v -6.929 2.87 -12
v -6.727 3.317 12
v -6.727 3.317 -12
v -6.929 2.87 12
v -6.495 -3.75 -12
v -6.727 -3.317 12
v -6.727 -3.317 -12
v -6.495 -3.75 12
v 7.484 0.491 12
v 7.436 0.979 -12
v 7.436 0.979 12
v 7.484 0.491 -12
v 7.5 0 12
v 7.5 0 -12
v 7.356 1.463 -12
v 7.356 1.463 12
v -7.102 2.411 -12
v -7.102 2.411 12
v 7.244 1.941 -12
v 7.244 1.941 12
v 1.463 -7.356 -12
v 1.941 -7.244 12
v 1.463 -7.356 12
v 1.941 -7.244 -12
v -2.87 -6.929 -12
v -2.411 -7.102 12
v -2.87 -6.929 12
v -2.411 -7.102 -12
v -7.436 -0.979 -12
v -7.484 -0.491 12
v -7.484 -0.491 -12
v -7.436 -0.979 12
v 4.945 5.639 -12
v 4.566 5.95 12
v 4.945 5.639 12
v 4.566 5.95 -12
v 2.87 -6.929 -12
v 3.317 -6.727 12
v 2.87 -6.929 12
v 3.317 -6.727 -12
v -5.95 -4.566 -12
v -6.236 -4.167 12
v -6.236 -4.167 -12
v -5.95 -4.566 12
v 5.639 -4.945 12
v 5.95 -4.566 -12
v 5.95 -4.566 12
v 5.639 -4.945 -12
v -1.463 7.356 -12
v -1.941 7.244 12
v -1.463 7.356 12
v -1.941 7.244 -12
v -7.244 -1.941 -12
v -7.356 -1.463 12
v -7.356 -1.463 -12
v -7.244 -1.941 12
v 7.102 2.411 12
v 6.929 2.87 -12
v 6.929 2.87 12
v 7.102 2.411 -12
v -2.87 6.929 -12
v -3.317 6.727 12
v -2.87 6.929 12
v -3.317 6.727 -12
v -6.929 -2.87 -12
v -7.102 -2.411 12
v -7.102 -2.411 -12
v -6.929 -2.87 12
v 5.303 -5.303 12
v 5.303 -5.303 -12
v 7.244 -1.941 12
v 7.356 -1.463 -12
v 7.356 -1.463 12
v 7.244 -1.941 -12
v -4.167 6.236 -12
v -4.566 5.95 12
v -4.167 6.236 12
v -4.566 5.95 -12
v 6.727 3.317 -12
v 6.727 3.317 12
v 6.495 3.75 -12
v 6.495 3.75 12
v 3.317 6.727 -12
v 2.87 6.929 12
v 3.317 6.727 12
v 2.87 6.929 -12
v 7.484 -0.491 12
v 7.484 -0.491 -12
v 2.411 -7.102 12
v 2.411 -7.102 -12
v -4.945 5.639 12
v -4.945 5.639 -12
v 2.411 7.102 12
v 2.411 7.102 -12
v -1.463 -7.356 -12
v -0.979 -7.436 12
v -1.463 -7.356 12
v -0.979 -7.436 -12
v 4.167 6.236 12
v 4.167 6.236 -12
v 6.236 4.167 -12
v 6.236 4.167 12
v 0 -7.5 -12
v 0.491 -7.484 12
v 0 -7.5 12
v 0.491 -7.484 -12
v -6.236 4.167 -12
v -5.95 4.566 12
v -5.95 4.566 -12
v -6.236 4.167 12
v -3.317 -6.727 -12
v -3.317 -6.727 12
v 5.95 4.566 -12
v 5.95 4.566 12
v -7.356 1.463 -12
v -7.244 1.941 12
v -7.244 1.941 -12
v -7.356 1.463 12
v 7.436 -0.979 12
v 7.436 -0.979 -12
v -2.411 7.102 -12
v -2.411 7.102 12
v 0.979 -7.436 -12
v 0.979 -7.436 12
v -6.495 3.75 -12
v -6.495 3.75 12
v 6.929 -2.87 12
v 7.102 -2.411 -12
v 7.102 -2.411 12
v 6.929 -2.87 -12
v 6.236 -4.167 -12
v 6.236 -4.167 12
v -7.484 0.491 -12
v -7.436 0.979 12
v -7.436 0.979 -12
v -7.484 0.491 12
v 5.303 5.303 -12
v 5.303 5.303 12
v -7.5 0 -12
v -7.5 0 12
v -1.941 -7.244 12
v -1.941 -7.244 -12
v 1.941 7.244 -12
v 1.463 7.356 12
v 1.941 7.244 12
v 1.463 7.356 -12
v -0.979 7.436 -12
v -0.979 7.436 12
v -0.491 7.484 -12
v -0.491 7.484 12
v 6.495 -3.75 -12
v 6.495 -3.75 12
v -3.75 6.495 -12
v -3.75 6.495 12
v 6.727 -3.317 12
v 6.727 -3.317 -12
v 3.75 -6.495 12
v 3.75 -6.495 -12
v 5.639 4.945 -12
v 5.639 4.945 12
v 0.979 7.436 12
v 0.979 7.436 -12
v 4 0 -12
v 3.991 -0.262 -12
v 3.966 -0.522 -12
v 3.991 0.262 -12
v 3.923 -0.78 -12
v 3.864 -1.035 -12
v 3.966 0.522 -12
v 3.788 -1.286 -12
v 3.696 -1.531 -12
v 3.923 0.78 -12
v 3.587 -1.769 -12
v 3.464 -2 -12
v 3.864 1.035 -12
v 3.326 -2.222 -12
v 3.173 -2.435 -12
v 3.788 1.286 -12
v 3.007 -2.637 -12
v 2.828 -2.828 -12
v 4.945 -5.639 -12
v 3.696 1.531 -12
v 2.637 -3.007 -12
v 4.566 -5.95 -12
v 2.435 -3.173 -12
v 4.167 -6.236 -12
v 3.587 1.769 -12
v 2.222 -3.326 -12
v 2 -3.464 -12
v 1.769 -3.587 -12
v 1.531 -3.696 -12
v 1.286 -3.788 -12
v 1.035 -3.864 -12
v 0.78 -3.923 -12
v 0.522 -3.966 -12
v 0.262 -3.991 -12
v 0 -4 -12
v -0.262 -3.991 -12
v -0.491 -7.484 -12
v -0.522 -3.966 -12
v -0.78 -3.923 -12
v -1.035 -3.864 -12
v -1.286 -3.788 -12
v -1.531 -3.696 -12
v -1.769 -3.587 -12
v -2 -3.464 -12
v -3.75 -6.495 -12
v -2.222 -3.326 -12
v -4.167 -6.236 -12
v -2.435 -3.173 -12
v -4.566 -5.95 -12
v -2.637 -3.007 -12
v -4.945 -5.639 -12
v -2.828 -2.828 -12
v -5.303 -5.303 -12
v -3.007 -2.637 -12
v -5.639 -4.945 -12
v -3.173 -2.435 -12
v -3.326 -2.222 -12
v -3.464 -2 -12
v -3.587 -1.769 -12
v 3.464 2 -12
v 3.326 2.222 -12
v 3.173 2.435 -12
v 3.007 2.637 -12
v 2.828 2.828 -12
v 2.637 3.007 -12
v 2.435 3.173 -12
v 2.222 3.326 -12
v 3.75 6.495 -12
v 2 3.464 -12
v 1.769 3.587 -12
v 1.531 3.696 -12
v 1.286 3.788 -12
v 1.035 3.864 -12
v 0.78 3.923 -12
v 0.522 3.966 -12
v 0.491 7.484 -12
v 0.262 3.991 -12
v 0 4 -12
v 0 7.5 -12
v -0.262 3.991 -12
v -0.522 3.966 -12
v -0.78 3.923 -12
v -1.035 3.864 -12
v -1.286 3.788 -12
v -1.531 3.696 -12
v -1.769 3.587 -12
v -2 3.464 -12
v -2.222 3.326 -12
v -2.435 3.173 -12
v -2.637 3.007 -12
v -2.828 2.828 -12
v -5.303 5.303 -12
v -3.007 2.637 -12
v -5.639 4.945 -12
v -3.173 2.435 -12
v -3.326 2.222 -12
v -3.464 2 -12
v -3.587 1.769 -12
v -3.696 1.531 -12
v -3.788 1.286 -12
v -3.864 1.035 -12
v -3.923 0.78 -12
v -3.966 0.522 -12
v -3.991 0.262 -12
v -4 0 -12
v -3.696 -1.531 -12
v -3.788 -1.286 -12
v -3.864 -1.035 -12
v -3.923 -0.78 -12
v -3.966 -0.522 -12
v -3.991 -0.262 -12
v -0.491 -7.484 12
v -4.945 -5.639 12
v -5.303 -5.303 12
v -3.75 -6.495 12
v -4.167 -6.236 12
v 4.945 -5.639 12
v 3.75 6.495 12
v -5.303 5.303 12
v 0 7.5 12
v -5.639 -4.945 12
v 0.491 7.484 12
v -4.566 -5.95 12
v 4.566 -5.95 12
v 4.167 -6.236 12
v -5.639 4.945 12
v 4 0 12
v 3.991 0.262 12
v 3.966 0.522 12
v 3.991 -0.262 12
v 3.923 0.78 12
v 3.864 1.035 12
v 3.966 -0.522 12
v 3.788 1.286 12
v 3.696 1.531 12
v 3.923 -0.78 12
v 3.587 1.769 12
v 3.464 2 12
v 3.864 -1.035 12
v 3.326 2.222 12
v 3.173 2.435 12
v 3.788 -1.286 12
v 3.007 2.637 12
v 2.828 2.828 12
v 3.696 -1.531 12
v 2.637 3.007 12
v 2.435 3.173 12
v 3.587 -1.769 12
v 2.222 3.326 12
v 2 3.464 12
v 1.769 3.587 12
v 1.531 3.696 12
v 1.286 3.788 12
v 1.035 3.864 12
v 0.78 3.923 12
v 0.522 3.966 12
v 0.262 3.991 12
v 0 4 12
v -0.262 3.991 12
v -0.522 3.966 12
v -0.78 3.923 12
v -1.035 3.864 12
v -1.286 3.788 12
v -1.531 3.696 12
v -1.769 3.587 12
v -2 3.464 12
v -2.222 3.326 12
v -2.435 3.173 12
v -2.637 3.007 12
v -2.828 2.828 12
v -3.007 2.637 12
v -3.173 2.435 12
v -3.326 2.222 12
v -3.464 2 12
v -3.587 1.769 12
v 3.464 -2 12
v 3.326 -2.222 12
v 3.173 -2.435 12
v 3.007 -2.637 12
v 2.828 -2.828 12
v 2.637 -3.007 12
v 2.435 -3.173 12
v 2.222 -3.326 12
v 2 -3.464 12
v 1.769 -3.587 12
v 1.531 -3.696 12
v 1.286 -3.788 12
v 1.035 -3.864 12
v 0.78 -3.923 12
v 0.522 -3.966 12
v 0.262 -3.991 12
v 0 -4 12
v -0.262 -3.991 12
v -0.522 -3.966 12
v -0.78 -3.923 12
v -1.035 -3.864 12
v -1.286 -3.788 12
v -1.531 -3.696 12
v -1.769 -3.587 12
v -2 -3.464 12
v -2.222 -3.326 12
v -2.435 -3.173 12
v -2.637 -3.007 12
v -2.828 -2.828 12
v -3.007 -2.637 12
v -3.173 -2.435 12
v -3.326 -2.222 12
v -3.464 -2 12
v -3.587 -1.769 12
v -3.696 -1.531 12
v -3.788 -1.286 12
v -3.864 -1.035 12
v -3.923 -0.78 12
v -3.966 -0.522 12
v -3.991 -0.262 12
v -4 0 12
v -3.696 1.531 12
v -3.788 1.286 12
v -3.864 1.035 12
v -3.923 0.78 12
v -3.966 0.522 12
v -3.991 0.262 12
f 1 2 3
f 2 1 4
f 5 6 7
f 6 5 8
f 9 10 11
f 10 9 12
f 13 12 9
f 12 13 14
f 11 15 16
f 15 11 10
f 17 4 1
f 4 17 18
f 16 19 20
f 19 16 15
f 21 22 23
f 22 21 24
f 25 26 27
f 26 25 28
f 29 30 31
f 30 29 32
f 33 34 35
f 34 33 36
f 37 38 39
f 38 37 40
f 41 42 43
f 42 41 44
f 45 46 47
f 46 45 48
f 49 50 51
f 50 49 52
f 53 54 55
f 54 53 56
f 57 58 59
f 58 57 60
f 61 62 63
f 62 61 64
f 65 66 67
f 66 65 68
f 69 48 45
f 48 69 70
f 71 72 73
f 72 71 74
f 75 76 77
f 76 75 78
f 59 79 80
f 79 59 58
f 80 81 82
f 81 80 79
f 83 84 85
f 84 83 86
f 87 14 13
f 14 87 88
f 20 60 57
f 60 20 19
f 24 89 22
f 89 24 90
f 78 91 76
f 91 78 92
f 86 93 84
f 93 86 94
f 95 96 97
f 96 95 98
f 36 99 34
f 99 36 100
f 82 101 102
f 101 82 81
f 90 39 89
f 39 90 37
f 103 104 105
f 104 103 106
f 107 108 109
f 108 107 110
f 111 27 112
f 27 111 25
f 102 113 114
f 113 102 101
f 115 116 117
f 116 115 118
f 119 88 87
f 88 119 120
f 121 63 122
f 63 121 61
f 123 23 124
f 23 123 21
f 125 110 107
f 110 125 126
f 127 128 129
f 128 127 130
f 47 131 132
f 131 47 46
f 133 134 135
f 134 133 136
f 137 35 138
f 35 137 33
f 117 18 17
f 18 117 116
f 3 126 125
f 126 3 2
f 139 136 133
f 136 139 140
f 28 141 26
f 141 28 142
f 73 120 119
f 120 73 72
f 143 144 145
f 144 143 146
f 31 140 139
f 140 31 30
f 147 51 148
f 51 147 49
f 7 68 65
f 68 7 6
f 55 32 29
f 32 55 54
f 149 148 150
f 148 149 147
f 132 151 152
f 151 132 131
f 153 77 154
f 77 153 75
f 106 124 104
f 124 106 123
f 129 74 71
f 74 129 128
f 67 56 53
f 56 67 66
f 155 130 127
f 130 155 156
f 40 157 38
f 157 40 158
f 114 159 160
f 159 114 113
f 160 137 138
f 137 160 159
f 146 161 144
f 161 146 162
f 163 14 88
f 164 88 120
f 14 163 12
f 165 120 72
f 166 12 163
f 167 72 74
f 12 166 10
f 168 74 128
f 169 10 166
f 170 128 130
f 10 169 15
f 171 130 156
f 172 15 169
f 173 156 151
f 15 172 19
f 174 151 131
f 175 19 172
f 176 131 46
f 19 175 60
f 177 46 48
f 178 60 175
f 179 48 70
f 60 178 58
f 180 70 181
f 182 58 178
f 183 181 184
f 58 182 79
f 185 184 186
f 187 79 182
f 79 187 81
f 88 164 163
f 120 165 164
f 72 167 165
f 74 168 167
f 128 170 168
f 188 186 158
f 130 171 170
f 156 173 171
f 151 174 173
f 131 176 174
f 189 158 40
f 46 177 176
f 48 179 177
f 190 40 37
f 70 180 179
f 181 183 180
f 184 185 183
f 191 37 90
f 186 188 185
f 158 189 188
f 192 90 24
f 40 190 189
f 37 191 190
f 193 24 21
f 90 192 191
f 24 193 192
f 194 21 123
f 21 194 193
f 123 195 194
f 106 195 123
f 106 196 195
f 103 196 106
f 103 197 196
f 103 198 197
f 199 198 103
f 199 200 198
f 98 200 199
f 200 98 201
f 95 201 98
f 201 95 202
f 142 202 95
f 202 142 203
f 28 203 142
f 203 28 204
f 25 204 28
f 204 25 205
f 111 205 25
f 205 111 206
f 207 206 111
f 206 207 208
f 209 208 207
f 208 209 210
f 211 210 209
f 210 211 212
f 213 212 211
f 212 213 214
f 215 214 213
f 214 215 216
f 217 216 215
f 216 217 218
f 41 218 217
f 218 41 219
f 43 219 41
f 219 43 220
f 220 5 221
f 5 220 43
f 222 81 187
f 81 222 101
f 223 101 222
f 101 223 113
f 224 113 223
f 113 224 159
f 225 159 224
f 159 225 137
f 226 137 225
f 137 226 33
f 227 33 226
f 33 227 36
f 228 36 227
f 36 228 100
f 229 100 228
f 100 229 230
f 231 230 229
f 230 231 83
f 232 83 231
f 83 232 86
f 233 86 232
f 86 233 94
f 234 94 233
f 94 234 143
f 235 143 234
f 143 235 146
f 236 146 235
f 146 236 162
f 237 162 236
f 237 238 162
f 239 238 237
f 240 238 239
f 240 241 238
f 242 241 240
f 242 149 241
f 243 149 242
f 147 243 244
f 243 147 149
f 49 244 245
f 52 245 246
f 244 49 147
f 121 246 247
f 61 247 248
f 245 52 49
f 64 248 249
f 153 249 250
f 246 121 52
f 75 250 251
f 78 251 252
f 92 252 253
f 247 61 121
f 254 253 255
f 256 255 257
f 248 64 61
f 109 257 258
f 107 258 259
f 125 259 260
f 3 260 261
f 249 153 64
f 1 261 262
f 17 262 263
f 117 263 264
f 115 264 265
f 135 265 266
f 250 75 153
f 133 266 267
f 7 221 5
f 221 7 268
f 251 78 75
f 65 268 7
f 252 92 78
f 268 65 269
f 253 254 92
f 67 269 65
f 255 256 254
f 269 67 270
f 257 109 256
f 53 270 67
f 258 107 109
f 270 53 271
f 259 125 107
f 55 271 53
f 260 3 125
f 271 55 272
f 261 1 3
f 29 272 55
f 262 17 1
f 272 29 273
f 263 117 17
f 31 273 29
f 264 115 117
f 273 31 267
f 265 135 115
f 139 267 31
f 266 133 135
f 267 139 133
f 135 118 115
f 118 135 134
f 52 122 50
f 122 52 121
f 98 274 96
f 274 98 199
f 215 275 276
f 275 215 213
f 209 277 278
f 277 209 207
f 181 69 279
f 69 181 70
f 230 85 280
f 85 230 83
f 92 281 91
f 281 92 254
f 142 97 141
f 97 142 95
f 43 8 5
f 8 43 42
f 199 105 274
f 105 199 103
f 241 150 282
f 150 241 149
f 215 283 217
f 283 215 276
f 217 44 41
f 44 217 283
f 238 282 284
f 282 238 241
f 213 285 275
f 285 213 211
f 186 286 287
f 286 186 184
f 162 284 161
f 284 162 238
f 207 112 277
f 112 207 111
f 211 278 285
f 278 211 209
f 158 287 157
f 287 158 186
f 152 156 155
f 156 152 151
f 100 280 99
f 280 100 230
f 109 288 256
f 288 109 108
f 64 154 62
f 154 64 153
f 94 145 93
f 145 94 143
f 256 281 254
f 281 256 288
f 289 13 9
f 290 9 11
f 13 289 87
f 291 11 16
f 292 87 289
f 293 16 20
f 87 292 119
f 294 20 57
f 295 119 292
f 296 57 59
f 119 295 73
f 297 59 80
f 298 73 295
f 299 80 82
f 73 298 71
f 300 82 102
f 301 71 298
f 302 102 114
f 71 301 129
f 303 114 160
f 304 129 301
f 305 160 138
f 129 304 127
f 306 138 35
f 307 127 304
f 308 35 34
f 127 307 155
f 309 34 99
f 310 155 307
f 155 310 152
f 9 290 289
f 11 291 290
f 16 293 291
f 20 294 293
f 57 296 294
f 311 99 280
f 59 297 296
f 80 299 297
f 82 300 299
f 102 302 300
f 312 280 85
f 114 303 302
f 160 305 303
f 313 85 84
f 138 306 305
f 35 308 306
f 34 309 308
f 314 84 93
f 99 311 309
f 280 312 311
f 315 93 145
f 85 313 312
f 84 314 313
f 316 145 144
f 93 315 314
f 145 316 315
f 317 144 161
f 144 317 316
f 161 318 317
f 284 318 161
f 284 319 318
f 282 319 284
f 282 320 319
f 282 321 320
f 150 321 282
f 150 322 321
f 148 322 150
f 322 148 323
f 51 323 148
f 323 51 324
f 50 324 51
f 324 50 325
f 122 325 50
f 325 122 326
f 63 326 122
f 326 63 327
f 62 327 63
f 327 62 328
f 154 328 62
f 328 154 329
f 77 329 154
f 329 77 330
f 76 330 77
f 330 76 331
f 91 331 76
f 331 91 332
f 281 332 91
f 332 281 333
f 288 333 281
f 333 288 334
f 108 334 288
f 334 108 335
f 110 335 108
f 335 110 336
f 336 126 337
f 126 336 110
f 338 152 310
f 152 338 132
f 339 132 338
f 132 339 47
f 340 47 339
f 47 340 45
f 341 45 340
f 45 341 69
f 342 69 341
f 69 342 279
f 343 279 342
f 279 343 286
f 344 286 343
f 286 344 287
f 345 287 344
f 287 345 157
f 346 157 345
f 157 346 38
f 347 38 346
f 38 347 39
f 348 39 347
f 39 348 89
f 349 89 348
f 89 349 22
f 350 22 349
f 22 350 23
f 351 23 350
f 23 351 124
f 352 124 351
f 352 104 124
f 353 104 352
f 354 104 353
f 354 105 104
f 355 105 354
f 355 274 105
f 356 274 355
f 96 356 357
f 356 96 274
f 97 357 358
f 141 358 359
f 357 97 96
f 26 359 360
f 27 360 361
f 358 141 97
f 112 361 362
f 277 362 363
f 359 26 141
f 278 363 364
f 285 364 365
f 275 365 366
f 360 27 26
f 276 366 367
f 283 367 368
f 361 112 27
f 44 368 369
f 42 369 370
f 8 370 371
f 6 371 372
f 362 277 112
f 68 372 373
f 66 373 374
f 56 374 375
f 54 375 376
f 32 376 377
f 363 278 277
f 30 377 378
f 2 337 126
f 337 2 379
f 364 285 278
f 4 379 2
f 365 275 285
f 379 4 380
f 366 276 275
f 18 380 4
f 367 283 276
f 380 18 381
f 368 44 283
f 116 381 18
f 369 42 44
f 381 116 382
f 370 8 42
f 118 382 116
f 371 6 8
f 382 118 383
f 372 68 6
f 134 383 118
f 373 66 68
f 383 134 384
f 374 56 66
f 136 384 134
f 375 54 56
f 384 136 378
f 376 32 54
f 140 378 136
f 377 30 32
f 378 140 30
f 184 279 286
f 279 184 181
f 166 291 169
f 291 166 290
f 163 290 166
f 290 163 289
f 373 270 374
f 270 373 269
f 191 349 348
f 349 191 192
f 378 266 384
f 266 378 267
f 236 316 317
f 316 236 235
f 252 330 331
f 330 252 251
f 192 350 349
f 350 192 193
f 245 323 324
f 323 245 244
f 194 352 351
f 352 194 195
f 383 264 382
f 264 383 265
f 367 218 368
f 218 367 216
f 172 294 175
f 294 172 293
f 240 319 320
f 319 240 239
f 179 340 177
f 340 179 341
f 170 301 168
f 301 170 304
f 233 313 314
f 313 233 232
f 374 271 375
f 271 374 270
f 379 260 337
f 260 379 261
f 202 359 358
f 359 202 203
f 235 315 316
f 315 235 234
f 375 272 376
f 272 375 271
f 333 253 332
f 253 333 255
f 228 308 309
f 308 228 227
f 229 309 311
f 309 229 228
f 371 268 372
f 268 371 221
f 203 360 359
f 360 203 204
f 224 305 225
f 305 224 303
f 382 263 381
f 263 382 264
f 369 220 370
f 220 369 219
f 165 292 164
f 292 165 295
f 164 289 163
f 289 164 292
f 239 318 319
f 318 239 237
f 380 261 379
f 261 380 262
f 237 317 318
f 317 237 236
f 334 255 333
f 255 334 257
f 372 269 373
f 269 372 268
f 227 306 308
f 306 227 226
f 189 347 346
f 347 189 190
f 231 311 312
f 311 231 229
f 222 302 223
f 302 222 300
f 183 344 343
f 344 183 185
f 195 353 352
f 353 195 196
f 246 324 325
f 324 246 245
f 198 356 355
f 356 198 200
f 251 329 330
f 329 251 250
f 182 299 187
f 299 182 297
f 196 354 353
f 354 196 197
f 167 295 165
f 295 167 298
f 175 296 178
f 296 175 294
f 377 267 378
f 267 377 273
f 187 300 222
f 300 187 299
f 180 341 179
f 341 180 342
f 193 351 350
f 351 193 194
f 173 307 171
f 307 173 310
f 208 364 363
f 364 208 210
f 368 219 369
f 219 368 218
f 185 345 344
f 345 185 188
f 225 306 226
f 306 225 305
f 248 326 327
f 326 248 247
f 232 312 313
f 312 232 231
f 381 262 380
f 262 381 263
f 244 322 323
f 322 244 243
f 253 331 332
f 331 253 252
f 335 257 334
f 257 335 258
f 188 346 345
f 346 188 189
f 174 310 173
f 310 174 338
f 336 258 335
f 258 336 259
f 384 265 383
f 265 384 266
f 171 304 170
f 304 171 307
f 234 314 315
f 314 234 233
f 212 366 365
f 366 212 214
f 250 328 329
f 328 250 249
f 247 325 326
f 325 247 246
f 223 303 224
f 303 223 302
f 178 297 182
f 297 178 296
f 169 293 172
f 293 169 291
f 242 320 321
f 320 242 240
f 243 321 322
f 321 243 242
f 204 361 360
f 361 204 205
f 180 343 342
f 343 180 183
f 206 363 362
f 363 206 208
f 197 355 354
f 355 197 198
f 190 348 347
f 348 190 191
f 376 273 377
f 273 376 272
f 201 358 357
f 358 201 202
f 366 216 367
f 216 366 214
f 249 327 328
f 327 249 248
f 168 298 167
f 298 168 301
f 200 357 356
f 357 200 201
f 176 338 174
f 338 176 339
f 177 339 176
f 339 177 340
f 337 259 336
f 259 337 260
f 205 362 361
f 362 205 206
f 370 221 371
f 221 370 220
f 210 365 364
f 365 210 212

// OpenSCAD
// Linear bearing (LM8UU-style simple body)
// Target dimensions: 8.0mm bore, 15.0mm outer diameter, 24.0mm length
// One connected solid (single part), no side features.

bore_diameter_mm  = 8.0;
outer_diameter_mm = 15.0;
length_mm         = 24.0;

overlap_mm = 0.2;
$fn = 96;

module linear_bearing_simple(bore_d, outer_d, len) {
    difference() {
        // Outer body
        cylinder(d=outer_d, h=len, center=true);

        // Through bore
        cylinder(d=bore_d, h=len + 2*overlap_mm, center=true);
    }
}

linear_bearing_simple(bore_diameter_mm, outer_diameter_mm, length_mm);
